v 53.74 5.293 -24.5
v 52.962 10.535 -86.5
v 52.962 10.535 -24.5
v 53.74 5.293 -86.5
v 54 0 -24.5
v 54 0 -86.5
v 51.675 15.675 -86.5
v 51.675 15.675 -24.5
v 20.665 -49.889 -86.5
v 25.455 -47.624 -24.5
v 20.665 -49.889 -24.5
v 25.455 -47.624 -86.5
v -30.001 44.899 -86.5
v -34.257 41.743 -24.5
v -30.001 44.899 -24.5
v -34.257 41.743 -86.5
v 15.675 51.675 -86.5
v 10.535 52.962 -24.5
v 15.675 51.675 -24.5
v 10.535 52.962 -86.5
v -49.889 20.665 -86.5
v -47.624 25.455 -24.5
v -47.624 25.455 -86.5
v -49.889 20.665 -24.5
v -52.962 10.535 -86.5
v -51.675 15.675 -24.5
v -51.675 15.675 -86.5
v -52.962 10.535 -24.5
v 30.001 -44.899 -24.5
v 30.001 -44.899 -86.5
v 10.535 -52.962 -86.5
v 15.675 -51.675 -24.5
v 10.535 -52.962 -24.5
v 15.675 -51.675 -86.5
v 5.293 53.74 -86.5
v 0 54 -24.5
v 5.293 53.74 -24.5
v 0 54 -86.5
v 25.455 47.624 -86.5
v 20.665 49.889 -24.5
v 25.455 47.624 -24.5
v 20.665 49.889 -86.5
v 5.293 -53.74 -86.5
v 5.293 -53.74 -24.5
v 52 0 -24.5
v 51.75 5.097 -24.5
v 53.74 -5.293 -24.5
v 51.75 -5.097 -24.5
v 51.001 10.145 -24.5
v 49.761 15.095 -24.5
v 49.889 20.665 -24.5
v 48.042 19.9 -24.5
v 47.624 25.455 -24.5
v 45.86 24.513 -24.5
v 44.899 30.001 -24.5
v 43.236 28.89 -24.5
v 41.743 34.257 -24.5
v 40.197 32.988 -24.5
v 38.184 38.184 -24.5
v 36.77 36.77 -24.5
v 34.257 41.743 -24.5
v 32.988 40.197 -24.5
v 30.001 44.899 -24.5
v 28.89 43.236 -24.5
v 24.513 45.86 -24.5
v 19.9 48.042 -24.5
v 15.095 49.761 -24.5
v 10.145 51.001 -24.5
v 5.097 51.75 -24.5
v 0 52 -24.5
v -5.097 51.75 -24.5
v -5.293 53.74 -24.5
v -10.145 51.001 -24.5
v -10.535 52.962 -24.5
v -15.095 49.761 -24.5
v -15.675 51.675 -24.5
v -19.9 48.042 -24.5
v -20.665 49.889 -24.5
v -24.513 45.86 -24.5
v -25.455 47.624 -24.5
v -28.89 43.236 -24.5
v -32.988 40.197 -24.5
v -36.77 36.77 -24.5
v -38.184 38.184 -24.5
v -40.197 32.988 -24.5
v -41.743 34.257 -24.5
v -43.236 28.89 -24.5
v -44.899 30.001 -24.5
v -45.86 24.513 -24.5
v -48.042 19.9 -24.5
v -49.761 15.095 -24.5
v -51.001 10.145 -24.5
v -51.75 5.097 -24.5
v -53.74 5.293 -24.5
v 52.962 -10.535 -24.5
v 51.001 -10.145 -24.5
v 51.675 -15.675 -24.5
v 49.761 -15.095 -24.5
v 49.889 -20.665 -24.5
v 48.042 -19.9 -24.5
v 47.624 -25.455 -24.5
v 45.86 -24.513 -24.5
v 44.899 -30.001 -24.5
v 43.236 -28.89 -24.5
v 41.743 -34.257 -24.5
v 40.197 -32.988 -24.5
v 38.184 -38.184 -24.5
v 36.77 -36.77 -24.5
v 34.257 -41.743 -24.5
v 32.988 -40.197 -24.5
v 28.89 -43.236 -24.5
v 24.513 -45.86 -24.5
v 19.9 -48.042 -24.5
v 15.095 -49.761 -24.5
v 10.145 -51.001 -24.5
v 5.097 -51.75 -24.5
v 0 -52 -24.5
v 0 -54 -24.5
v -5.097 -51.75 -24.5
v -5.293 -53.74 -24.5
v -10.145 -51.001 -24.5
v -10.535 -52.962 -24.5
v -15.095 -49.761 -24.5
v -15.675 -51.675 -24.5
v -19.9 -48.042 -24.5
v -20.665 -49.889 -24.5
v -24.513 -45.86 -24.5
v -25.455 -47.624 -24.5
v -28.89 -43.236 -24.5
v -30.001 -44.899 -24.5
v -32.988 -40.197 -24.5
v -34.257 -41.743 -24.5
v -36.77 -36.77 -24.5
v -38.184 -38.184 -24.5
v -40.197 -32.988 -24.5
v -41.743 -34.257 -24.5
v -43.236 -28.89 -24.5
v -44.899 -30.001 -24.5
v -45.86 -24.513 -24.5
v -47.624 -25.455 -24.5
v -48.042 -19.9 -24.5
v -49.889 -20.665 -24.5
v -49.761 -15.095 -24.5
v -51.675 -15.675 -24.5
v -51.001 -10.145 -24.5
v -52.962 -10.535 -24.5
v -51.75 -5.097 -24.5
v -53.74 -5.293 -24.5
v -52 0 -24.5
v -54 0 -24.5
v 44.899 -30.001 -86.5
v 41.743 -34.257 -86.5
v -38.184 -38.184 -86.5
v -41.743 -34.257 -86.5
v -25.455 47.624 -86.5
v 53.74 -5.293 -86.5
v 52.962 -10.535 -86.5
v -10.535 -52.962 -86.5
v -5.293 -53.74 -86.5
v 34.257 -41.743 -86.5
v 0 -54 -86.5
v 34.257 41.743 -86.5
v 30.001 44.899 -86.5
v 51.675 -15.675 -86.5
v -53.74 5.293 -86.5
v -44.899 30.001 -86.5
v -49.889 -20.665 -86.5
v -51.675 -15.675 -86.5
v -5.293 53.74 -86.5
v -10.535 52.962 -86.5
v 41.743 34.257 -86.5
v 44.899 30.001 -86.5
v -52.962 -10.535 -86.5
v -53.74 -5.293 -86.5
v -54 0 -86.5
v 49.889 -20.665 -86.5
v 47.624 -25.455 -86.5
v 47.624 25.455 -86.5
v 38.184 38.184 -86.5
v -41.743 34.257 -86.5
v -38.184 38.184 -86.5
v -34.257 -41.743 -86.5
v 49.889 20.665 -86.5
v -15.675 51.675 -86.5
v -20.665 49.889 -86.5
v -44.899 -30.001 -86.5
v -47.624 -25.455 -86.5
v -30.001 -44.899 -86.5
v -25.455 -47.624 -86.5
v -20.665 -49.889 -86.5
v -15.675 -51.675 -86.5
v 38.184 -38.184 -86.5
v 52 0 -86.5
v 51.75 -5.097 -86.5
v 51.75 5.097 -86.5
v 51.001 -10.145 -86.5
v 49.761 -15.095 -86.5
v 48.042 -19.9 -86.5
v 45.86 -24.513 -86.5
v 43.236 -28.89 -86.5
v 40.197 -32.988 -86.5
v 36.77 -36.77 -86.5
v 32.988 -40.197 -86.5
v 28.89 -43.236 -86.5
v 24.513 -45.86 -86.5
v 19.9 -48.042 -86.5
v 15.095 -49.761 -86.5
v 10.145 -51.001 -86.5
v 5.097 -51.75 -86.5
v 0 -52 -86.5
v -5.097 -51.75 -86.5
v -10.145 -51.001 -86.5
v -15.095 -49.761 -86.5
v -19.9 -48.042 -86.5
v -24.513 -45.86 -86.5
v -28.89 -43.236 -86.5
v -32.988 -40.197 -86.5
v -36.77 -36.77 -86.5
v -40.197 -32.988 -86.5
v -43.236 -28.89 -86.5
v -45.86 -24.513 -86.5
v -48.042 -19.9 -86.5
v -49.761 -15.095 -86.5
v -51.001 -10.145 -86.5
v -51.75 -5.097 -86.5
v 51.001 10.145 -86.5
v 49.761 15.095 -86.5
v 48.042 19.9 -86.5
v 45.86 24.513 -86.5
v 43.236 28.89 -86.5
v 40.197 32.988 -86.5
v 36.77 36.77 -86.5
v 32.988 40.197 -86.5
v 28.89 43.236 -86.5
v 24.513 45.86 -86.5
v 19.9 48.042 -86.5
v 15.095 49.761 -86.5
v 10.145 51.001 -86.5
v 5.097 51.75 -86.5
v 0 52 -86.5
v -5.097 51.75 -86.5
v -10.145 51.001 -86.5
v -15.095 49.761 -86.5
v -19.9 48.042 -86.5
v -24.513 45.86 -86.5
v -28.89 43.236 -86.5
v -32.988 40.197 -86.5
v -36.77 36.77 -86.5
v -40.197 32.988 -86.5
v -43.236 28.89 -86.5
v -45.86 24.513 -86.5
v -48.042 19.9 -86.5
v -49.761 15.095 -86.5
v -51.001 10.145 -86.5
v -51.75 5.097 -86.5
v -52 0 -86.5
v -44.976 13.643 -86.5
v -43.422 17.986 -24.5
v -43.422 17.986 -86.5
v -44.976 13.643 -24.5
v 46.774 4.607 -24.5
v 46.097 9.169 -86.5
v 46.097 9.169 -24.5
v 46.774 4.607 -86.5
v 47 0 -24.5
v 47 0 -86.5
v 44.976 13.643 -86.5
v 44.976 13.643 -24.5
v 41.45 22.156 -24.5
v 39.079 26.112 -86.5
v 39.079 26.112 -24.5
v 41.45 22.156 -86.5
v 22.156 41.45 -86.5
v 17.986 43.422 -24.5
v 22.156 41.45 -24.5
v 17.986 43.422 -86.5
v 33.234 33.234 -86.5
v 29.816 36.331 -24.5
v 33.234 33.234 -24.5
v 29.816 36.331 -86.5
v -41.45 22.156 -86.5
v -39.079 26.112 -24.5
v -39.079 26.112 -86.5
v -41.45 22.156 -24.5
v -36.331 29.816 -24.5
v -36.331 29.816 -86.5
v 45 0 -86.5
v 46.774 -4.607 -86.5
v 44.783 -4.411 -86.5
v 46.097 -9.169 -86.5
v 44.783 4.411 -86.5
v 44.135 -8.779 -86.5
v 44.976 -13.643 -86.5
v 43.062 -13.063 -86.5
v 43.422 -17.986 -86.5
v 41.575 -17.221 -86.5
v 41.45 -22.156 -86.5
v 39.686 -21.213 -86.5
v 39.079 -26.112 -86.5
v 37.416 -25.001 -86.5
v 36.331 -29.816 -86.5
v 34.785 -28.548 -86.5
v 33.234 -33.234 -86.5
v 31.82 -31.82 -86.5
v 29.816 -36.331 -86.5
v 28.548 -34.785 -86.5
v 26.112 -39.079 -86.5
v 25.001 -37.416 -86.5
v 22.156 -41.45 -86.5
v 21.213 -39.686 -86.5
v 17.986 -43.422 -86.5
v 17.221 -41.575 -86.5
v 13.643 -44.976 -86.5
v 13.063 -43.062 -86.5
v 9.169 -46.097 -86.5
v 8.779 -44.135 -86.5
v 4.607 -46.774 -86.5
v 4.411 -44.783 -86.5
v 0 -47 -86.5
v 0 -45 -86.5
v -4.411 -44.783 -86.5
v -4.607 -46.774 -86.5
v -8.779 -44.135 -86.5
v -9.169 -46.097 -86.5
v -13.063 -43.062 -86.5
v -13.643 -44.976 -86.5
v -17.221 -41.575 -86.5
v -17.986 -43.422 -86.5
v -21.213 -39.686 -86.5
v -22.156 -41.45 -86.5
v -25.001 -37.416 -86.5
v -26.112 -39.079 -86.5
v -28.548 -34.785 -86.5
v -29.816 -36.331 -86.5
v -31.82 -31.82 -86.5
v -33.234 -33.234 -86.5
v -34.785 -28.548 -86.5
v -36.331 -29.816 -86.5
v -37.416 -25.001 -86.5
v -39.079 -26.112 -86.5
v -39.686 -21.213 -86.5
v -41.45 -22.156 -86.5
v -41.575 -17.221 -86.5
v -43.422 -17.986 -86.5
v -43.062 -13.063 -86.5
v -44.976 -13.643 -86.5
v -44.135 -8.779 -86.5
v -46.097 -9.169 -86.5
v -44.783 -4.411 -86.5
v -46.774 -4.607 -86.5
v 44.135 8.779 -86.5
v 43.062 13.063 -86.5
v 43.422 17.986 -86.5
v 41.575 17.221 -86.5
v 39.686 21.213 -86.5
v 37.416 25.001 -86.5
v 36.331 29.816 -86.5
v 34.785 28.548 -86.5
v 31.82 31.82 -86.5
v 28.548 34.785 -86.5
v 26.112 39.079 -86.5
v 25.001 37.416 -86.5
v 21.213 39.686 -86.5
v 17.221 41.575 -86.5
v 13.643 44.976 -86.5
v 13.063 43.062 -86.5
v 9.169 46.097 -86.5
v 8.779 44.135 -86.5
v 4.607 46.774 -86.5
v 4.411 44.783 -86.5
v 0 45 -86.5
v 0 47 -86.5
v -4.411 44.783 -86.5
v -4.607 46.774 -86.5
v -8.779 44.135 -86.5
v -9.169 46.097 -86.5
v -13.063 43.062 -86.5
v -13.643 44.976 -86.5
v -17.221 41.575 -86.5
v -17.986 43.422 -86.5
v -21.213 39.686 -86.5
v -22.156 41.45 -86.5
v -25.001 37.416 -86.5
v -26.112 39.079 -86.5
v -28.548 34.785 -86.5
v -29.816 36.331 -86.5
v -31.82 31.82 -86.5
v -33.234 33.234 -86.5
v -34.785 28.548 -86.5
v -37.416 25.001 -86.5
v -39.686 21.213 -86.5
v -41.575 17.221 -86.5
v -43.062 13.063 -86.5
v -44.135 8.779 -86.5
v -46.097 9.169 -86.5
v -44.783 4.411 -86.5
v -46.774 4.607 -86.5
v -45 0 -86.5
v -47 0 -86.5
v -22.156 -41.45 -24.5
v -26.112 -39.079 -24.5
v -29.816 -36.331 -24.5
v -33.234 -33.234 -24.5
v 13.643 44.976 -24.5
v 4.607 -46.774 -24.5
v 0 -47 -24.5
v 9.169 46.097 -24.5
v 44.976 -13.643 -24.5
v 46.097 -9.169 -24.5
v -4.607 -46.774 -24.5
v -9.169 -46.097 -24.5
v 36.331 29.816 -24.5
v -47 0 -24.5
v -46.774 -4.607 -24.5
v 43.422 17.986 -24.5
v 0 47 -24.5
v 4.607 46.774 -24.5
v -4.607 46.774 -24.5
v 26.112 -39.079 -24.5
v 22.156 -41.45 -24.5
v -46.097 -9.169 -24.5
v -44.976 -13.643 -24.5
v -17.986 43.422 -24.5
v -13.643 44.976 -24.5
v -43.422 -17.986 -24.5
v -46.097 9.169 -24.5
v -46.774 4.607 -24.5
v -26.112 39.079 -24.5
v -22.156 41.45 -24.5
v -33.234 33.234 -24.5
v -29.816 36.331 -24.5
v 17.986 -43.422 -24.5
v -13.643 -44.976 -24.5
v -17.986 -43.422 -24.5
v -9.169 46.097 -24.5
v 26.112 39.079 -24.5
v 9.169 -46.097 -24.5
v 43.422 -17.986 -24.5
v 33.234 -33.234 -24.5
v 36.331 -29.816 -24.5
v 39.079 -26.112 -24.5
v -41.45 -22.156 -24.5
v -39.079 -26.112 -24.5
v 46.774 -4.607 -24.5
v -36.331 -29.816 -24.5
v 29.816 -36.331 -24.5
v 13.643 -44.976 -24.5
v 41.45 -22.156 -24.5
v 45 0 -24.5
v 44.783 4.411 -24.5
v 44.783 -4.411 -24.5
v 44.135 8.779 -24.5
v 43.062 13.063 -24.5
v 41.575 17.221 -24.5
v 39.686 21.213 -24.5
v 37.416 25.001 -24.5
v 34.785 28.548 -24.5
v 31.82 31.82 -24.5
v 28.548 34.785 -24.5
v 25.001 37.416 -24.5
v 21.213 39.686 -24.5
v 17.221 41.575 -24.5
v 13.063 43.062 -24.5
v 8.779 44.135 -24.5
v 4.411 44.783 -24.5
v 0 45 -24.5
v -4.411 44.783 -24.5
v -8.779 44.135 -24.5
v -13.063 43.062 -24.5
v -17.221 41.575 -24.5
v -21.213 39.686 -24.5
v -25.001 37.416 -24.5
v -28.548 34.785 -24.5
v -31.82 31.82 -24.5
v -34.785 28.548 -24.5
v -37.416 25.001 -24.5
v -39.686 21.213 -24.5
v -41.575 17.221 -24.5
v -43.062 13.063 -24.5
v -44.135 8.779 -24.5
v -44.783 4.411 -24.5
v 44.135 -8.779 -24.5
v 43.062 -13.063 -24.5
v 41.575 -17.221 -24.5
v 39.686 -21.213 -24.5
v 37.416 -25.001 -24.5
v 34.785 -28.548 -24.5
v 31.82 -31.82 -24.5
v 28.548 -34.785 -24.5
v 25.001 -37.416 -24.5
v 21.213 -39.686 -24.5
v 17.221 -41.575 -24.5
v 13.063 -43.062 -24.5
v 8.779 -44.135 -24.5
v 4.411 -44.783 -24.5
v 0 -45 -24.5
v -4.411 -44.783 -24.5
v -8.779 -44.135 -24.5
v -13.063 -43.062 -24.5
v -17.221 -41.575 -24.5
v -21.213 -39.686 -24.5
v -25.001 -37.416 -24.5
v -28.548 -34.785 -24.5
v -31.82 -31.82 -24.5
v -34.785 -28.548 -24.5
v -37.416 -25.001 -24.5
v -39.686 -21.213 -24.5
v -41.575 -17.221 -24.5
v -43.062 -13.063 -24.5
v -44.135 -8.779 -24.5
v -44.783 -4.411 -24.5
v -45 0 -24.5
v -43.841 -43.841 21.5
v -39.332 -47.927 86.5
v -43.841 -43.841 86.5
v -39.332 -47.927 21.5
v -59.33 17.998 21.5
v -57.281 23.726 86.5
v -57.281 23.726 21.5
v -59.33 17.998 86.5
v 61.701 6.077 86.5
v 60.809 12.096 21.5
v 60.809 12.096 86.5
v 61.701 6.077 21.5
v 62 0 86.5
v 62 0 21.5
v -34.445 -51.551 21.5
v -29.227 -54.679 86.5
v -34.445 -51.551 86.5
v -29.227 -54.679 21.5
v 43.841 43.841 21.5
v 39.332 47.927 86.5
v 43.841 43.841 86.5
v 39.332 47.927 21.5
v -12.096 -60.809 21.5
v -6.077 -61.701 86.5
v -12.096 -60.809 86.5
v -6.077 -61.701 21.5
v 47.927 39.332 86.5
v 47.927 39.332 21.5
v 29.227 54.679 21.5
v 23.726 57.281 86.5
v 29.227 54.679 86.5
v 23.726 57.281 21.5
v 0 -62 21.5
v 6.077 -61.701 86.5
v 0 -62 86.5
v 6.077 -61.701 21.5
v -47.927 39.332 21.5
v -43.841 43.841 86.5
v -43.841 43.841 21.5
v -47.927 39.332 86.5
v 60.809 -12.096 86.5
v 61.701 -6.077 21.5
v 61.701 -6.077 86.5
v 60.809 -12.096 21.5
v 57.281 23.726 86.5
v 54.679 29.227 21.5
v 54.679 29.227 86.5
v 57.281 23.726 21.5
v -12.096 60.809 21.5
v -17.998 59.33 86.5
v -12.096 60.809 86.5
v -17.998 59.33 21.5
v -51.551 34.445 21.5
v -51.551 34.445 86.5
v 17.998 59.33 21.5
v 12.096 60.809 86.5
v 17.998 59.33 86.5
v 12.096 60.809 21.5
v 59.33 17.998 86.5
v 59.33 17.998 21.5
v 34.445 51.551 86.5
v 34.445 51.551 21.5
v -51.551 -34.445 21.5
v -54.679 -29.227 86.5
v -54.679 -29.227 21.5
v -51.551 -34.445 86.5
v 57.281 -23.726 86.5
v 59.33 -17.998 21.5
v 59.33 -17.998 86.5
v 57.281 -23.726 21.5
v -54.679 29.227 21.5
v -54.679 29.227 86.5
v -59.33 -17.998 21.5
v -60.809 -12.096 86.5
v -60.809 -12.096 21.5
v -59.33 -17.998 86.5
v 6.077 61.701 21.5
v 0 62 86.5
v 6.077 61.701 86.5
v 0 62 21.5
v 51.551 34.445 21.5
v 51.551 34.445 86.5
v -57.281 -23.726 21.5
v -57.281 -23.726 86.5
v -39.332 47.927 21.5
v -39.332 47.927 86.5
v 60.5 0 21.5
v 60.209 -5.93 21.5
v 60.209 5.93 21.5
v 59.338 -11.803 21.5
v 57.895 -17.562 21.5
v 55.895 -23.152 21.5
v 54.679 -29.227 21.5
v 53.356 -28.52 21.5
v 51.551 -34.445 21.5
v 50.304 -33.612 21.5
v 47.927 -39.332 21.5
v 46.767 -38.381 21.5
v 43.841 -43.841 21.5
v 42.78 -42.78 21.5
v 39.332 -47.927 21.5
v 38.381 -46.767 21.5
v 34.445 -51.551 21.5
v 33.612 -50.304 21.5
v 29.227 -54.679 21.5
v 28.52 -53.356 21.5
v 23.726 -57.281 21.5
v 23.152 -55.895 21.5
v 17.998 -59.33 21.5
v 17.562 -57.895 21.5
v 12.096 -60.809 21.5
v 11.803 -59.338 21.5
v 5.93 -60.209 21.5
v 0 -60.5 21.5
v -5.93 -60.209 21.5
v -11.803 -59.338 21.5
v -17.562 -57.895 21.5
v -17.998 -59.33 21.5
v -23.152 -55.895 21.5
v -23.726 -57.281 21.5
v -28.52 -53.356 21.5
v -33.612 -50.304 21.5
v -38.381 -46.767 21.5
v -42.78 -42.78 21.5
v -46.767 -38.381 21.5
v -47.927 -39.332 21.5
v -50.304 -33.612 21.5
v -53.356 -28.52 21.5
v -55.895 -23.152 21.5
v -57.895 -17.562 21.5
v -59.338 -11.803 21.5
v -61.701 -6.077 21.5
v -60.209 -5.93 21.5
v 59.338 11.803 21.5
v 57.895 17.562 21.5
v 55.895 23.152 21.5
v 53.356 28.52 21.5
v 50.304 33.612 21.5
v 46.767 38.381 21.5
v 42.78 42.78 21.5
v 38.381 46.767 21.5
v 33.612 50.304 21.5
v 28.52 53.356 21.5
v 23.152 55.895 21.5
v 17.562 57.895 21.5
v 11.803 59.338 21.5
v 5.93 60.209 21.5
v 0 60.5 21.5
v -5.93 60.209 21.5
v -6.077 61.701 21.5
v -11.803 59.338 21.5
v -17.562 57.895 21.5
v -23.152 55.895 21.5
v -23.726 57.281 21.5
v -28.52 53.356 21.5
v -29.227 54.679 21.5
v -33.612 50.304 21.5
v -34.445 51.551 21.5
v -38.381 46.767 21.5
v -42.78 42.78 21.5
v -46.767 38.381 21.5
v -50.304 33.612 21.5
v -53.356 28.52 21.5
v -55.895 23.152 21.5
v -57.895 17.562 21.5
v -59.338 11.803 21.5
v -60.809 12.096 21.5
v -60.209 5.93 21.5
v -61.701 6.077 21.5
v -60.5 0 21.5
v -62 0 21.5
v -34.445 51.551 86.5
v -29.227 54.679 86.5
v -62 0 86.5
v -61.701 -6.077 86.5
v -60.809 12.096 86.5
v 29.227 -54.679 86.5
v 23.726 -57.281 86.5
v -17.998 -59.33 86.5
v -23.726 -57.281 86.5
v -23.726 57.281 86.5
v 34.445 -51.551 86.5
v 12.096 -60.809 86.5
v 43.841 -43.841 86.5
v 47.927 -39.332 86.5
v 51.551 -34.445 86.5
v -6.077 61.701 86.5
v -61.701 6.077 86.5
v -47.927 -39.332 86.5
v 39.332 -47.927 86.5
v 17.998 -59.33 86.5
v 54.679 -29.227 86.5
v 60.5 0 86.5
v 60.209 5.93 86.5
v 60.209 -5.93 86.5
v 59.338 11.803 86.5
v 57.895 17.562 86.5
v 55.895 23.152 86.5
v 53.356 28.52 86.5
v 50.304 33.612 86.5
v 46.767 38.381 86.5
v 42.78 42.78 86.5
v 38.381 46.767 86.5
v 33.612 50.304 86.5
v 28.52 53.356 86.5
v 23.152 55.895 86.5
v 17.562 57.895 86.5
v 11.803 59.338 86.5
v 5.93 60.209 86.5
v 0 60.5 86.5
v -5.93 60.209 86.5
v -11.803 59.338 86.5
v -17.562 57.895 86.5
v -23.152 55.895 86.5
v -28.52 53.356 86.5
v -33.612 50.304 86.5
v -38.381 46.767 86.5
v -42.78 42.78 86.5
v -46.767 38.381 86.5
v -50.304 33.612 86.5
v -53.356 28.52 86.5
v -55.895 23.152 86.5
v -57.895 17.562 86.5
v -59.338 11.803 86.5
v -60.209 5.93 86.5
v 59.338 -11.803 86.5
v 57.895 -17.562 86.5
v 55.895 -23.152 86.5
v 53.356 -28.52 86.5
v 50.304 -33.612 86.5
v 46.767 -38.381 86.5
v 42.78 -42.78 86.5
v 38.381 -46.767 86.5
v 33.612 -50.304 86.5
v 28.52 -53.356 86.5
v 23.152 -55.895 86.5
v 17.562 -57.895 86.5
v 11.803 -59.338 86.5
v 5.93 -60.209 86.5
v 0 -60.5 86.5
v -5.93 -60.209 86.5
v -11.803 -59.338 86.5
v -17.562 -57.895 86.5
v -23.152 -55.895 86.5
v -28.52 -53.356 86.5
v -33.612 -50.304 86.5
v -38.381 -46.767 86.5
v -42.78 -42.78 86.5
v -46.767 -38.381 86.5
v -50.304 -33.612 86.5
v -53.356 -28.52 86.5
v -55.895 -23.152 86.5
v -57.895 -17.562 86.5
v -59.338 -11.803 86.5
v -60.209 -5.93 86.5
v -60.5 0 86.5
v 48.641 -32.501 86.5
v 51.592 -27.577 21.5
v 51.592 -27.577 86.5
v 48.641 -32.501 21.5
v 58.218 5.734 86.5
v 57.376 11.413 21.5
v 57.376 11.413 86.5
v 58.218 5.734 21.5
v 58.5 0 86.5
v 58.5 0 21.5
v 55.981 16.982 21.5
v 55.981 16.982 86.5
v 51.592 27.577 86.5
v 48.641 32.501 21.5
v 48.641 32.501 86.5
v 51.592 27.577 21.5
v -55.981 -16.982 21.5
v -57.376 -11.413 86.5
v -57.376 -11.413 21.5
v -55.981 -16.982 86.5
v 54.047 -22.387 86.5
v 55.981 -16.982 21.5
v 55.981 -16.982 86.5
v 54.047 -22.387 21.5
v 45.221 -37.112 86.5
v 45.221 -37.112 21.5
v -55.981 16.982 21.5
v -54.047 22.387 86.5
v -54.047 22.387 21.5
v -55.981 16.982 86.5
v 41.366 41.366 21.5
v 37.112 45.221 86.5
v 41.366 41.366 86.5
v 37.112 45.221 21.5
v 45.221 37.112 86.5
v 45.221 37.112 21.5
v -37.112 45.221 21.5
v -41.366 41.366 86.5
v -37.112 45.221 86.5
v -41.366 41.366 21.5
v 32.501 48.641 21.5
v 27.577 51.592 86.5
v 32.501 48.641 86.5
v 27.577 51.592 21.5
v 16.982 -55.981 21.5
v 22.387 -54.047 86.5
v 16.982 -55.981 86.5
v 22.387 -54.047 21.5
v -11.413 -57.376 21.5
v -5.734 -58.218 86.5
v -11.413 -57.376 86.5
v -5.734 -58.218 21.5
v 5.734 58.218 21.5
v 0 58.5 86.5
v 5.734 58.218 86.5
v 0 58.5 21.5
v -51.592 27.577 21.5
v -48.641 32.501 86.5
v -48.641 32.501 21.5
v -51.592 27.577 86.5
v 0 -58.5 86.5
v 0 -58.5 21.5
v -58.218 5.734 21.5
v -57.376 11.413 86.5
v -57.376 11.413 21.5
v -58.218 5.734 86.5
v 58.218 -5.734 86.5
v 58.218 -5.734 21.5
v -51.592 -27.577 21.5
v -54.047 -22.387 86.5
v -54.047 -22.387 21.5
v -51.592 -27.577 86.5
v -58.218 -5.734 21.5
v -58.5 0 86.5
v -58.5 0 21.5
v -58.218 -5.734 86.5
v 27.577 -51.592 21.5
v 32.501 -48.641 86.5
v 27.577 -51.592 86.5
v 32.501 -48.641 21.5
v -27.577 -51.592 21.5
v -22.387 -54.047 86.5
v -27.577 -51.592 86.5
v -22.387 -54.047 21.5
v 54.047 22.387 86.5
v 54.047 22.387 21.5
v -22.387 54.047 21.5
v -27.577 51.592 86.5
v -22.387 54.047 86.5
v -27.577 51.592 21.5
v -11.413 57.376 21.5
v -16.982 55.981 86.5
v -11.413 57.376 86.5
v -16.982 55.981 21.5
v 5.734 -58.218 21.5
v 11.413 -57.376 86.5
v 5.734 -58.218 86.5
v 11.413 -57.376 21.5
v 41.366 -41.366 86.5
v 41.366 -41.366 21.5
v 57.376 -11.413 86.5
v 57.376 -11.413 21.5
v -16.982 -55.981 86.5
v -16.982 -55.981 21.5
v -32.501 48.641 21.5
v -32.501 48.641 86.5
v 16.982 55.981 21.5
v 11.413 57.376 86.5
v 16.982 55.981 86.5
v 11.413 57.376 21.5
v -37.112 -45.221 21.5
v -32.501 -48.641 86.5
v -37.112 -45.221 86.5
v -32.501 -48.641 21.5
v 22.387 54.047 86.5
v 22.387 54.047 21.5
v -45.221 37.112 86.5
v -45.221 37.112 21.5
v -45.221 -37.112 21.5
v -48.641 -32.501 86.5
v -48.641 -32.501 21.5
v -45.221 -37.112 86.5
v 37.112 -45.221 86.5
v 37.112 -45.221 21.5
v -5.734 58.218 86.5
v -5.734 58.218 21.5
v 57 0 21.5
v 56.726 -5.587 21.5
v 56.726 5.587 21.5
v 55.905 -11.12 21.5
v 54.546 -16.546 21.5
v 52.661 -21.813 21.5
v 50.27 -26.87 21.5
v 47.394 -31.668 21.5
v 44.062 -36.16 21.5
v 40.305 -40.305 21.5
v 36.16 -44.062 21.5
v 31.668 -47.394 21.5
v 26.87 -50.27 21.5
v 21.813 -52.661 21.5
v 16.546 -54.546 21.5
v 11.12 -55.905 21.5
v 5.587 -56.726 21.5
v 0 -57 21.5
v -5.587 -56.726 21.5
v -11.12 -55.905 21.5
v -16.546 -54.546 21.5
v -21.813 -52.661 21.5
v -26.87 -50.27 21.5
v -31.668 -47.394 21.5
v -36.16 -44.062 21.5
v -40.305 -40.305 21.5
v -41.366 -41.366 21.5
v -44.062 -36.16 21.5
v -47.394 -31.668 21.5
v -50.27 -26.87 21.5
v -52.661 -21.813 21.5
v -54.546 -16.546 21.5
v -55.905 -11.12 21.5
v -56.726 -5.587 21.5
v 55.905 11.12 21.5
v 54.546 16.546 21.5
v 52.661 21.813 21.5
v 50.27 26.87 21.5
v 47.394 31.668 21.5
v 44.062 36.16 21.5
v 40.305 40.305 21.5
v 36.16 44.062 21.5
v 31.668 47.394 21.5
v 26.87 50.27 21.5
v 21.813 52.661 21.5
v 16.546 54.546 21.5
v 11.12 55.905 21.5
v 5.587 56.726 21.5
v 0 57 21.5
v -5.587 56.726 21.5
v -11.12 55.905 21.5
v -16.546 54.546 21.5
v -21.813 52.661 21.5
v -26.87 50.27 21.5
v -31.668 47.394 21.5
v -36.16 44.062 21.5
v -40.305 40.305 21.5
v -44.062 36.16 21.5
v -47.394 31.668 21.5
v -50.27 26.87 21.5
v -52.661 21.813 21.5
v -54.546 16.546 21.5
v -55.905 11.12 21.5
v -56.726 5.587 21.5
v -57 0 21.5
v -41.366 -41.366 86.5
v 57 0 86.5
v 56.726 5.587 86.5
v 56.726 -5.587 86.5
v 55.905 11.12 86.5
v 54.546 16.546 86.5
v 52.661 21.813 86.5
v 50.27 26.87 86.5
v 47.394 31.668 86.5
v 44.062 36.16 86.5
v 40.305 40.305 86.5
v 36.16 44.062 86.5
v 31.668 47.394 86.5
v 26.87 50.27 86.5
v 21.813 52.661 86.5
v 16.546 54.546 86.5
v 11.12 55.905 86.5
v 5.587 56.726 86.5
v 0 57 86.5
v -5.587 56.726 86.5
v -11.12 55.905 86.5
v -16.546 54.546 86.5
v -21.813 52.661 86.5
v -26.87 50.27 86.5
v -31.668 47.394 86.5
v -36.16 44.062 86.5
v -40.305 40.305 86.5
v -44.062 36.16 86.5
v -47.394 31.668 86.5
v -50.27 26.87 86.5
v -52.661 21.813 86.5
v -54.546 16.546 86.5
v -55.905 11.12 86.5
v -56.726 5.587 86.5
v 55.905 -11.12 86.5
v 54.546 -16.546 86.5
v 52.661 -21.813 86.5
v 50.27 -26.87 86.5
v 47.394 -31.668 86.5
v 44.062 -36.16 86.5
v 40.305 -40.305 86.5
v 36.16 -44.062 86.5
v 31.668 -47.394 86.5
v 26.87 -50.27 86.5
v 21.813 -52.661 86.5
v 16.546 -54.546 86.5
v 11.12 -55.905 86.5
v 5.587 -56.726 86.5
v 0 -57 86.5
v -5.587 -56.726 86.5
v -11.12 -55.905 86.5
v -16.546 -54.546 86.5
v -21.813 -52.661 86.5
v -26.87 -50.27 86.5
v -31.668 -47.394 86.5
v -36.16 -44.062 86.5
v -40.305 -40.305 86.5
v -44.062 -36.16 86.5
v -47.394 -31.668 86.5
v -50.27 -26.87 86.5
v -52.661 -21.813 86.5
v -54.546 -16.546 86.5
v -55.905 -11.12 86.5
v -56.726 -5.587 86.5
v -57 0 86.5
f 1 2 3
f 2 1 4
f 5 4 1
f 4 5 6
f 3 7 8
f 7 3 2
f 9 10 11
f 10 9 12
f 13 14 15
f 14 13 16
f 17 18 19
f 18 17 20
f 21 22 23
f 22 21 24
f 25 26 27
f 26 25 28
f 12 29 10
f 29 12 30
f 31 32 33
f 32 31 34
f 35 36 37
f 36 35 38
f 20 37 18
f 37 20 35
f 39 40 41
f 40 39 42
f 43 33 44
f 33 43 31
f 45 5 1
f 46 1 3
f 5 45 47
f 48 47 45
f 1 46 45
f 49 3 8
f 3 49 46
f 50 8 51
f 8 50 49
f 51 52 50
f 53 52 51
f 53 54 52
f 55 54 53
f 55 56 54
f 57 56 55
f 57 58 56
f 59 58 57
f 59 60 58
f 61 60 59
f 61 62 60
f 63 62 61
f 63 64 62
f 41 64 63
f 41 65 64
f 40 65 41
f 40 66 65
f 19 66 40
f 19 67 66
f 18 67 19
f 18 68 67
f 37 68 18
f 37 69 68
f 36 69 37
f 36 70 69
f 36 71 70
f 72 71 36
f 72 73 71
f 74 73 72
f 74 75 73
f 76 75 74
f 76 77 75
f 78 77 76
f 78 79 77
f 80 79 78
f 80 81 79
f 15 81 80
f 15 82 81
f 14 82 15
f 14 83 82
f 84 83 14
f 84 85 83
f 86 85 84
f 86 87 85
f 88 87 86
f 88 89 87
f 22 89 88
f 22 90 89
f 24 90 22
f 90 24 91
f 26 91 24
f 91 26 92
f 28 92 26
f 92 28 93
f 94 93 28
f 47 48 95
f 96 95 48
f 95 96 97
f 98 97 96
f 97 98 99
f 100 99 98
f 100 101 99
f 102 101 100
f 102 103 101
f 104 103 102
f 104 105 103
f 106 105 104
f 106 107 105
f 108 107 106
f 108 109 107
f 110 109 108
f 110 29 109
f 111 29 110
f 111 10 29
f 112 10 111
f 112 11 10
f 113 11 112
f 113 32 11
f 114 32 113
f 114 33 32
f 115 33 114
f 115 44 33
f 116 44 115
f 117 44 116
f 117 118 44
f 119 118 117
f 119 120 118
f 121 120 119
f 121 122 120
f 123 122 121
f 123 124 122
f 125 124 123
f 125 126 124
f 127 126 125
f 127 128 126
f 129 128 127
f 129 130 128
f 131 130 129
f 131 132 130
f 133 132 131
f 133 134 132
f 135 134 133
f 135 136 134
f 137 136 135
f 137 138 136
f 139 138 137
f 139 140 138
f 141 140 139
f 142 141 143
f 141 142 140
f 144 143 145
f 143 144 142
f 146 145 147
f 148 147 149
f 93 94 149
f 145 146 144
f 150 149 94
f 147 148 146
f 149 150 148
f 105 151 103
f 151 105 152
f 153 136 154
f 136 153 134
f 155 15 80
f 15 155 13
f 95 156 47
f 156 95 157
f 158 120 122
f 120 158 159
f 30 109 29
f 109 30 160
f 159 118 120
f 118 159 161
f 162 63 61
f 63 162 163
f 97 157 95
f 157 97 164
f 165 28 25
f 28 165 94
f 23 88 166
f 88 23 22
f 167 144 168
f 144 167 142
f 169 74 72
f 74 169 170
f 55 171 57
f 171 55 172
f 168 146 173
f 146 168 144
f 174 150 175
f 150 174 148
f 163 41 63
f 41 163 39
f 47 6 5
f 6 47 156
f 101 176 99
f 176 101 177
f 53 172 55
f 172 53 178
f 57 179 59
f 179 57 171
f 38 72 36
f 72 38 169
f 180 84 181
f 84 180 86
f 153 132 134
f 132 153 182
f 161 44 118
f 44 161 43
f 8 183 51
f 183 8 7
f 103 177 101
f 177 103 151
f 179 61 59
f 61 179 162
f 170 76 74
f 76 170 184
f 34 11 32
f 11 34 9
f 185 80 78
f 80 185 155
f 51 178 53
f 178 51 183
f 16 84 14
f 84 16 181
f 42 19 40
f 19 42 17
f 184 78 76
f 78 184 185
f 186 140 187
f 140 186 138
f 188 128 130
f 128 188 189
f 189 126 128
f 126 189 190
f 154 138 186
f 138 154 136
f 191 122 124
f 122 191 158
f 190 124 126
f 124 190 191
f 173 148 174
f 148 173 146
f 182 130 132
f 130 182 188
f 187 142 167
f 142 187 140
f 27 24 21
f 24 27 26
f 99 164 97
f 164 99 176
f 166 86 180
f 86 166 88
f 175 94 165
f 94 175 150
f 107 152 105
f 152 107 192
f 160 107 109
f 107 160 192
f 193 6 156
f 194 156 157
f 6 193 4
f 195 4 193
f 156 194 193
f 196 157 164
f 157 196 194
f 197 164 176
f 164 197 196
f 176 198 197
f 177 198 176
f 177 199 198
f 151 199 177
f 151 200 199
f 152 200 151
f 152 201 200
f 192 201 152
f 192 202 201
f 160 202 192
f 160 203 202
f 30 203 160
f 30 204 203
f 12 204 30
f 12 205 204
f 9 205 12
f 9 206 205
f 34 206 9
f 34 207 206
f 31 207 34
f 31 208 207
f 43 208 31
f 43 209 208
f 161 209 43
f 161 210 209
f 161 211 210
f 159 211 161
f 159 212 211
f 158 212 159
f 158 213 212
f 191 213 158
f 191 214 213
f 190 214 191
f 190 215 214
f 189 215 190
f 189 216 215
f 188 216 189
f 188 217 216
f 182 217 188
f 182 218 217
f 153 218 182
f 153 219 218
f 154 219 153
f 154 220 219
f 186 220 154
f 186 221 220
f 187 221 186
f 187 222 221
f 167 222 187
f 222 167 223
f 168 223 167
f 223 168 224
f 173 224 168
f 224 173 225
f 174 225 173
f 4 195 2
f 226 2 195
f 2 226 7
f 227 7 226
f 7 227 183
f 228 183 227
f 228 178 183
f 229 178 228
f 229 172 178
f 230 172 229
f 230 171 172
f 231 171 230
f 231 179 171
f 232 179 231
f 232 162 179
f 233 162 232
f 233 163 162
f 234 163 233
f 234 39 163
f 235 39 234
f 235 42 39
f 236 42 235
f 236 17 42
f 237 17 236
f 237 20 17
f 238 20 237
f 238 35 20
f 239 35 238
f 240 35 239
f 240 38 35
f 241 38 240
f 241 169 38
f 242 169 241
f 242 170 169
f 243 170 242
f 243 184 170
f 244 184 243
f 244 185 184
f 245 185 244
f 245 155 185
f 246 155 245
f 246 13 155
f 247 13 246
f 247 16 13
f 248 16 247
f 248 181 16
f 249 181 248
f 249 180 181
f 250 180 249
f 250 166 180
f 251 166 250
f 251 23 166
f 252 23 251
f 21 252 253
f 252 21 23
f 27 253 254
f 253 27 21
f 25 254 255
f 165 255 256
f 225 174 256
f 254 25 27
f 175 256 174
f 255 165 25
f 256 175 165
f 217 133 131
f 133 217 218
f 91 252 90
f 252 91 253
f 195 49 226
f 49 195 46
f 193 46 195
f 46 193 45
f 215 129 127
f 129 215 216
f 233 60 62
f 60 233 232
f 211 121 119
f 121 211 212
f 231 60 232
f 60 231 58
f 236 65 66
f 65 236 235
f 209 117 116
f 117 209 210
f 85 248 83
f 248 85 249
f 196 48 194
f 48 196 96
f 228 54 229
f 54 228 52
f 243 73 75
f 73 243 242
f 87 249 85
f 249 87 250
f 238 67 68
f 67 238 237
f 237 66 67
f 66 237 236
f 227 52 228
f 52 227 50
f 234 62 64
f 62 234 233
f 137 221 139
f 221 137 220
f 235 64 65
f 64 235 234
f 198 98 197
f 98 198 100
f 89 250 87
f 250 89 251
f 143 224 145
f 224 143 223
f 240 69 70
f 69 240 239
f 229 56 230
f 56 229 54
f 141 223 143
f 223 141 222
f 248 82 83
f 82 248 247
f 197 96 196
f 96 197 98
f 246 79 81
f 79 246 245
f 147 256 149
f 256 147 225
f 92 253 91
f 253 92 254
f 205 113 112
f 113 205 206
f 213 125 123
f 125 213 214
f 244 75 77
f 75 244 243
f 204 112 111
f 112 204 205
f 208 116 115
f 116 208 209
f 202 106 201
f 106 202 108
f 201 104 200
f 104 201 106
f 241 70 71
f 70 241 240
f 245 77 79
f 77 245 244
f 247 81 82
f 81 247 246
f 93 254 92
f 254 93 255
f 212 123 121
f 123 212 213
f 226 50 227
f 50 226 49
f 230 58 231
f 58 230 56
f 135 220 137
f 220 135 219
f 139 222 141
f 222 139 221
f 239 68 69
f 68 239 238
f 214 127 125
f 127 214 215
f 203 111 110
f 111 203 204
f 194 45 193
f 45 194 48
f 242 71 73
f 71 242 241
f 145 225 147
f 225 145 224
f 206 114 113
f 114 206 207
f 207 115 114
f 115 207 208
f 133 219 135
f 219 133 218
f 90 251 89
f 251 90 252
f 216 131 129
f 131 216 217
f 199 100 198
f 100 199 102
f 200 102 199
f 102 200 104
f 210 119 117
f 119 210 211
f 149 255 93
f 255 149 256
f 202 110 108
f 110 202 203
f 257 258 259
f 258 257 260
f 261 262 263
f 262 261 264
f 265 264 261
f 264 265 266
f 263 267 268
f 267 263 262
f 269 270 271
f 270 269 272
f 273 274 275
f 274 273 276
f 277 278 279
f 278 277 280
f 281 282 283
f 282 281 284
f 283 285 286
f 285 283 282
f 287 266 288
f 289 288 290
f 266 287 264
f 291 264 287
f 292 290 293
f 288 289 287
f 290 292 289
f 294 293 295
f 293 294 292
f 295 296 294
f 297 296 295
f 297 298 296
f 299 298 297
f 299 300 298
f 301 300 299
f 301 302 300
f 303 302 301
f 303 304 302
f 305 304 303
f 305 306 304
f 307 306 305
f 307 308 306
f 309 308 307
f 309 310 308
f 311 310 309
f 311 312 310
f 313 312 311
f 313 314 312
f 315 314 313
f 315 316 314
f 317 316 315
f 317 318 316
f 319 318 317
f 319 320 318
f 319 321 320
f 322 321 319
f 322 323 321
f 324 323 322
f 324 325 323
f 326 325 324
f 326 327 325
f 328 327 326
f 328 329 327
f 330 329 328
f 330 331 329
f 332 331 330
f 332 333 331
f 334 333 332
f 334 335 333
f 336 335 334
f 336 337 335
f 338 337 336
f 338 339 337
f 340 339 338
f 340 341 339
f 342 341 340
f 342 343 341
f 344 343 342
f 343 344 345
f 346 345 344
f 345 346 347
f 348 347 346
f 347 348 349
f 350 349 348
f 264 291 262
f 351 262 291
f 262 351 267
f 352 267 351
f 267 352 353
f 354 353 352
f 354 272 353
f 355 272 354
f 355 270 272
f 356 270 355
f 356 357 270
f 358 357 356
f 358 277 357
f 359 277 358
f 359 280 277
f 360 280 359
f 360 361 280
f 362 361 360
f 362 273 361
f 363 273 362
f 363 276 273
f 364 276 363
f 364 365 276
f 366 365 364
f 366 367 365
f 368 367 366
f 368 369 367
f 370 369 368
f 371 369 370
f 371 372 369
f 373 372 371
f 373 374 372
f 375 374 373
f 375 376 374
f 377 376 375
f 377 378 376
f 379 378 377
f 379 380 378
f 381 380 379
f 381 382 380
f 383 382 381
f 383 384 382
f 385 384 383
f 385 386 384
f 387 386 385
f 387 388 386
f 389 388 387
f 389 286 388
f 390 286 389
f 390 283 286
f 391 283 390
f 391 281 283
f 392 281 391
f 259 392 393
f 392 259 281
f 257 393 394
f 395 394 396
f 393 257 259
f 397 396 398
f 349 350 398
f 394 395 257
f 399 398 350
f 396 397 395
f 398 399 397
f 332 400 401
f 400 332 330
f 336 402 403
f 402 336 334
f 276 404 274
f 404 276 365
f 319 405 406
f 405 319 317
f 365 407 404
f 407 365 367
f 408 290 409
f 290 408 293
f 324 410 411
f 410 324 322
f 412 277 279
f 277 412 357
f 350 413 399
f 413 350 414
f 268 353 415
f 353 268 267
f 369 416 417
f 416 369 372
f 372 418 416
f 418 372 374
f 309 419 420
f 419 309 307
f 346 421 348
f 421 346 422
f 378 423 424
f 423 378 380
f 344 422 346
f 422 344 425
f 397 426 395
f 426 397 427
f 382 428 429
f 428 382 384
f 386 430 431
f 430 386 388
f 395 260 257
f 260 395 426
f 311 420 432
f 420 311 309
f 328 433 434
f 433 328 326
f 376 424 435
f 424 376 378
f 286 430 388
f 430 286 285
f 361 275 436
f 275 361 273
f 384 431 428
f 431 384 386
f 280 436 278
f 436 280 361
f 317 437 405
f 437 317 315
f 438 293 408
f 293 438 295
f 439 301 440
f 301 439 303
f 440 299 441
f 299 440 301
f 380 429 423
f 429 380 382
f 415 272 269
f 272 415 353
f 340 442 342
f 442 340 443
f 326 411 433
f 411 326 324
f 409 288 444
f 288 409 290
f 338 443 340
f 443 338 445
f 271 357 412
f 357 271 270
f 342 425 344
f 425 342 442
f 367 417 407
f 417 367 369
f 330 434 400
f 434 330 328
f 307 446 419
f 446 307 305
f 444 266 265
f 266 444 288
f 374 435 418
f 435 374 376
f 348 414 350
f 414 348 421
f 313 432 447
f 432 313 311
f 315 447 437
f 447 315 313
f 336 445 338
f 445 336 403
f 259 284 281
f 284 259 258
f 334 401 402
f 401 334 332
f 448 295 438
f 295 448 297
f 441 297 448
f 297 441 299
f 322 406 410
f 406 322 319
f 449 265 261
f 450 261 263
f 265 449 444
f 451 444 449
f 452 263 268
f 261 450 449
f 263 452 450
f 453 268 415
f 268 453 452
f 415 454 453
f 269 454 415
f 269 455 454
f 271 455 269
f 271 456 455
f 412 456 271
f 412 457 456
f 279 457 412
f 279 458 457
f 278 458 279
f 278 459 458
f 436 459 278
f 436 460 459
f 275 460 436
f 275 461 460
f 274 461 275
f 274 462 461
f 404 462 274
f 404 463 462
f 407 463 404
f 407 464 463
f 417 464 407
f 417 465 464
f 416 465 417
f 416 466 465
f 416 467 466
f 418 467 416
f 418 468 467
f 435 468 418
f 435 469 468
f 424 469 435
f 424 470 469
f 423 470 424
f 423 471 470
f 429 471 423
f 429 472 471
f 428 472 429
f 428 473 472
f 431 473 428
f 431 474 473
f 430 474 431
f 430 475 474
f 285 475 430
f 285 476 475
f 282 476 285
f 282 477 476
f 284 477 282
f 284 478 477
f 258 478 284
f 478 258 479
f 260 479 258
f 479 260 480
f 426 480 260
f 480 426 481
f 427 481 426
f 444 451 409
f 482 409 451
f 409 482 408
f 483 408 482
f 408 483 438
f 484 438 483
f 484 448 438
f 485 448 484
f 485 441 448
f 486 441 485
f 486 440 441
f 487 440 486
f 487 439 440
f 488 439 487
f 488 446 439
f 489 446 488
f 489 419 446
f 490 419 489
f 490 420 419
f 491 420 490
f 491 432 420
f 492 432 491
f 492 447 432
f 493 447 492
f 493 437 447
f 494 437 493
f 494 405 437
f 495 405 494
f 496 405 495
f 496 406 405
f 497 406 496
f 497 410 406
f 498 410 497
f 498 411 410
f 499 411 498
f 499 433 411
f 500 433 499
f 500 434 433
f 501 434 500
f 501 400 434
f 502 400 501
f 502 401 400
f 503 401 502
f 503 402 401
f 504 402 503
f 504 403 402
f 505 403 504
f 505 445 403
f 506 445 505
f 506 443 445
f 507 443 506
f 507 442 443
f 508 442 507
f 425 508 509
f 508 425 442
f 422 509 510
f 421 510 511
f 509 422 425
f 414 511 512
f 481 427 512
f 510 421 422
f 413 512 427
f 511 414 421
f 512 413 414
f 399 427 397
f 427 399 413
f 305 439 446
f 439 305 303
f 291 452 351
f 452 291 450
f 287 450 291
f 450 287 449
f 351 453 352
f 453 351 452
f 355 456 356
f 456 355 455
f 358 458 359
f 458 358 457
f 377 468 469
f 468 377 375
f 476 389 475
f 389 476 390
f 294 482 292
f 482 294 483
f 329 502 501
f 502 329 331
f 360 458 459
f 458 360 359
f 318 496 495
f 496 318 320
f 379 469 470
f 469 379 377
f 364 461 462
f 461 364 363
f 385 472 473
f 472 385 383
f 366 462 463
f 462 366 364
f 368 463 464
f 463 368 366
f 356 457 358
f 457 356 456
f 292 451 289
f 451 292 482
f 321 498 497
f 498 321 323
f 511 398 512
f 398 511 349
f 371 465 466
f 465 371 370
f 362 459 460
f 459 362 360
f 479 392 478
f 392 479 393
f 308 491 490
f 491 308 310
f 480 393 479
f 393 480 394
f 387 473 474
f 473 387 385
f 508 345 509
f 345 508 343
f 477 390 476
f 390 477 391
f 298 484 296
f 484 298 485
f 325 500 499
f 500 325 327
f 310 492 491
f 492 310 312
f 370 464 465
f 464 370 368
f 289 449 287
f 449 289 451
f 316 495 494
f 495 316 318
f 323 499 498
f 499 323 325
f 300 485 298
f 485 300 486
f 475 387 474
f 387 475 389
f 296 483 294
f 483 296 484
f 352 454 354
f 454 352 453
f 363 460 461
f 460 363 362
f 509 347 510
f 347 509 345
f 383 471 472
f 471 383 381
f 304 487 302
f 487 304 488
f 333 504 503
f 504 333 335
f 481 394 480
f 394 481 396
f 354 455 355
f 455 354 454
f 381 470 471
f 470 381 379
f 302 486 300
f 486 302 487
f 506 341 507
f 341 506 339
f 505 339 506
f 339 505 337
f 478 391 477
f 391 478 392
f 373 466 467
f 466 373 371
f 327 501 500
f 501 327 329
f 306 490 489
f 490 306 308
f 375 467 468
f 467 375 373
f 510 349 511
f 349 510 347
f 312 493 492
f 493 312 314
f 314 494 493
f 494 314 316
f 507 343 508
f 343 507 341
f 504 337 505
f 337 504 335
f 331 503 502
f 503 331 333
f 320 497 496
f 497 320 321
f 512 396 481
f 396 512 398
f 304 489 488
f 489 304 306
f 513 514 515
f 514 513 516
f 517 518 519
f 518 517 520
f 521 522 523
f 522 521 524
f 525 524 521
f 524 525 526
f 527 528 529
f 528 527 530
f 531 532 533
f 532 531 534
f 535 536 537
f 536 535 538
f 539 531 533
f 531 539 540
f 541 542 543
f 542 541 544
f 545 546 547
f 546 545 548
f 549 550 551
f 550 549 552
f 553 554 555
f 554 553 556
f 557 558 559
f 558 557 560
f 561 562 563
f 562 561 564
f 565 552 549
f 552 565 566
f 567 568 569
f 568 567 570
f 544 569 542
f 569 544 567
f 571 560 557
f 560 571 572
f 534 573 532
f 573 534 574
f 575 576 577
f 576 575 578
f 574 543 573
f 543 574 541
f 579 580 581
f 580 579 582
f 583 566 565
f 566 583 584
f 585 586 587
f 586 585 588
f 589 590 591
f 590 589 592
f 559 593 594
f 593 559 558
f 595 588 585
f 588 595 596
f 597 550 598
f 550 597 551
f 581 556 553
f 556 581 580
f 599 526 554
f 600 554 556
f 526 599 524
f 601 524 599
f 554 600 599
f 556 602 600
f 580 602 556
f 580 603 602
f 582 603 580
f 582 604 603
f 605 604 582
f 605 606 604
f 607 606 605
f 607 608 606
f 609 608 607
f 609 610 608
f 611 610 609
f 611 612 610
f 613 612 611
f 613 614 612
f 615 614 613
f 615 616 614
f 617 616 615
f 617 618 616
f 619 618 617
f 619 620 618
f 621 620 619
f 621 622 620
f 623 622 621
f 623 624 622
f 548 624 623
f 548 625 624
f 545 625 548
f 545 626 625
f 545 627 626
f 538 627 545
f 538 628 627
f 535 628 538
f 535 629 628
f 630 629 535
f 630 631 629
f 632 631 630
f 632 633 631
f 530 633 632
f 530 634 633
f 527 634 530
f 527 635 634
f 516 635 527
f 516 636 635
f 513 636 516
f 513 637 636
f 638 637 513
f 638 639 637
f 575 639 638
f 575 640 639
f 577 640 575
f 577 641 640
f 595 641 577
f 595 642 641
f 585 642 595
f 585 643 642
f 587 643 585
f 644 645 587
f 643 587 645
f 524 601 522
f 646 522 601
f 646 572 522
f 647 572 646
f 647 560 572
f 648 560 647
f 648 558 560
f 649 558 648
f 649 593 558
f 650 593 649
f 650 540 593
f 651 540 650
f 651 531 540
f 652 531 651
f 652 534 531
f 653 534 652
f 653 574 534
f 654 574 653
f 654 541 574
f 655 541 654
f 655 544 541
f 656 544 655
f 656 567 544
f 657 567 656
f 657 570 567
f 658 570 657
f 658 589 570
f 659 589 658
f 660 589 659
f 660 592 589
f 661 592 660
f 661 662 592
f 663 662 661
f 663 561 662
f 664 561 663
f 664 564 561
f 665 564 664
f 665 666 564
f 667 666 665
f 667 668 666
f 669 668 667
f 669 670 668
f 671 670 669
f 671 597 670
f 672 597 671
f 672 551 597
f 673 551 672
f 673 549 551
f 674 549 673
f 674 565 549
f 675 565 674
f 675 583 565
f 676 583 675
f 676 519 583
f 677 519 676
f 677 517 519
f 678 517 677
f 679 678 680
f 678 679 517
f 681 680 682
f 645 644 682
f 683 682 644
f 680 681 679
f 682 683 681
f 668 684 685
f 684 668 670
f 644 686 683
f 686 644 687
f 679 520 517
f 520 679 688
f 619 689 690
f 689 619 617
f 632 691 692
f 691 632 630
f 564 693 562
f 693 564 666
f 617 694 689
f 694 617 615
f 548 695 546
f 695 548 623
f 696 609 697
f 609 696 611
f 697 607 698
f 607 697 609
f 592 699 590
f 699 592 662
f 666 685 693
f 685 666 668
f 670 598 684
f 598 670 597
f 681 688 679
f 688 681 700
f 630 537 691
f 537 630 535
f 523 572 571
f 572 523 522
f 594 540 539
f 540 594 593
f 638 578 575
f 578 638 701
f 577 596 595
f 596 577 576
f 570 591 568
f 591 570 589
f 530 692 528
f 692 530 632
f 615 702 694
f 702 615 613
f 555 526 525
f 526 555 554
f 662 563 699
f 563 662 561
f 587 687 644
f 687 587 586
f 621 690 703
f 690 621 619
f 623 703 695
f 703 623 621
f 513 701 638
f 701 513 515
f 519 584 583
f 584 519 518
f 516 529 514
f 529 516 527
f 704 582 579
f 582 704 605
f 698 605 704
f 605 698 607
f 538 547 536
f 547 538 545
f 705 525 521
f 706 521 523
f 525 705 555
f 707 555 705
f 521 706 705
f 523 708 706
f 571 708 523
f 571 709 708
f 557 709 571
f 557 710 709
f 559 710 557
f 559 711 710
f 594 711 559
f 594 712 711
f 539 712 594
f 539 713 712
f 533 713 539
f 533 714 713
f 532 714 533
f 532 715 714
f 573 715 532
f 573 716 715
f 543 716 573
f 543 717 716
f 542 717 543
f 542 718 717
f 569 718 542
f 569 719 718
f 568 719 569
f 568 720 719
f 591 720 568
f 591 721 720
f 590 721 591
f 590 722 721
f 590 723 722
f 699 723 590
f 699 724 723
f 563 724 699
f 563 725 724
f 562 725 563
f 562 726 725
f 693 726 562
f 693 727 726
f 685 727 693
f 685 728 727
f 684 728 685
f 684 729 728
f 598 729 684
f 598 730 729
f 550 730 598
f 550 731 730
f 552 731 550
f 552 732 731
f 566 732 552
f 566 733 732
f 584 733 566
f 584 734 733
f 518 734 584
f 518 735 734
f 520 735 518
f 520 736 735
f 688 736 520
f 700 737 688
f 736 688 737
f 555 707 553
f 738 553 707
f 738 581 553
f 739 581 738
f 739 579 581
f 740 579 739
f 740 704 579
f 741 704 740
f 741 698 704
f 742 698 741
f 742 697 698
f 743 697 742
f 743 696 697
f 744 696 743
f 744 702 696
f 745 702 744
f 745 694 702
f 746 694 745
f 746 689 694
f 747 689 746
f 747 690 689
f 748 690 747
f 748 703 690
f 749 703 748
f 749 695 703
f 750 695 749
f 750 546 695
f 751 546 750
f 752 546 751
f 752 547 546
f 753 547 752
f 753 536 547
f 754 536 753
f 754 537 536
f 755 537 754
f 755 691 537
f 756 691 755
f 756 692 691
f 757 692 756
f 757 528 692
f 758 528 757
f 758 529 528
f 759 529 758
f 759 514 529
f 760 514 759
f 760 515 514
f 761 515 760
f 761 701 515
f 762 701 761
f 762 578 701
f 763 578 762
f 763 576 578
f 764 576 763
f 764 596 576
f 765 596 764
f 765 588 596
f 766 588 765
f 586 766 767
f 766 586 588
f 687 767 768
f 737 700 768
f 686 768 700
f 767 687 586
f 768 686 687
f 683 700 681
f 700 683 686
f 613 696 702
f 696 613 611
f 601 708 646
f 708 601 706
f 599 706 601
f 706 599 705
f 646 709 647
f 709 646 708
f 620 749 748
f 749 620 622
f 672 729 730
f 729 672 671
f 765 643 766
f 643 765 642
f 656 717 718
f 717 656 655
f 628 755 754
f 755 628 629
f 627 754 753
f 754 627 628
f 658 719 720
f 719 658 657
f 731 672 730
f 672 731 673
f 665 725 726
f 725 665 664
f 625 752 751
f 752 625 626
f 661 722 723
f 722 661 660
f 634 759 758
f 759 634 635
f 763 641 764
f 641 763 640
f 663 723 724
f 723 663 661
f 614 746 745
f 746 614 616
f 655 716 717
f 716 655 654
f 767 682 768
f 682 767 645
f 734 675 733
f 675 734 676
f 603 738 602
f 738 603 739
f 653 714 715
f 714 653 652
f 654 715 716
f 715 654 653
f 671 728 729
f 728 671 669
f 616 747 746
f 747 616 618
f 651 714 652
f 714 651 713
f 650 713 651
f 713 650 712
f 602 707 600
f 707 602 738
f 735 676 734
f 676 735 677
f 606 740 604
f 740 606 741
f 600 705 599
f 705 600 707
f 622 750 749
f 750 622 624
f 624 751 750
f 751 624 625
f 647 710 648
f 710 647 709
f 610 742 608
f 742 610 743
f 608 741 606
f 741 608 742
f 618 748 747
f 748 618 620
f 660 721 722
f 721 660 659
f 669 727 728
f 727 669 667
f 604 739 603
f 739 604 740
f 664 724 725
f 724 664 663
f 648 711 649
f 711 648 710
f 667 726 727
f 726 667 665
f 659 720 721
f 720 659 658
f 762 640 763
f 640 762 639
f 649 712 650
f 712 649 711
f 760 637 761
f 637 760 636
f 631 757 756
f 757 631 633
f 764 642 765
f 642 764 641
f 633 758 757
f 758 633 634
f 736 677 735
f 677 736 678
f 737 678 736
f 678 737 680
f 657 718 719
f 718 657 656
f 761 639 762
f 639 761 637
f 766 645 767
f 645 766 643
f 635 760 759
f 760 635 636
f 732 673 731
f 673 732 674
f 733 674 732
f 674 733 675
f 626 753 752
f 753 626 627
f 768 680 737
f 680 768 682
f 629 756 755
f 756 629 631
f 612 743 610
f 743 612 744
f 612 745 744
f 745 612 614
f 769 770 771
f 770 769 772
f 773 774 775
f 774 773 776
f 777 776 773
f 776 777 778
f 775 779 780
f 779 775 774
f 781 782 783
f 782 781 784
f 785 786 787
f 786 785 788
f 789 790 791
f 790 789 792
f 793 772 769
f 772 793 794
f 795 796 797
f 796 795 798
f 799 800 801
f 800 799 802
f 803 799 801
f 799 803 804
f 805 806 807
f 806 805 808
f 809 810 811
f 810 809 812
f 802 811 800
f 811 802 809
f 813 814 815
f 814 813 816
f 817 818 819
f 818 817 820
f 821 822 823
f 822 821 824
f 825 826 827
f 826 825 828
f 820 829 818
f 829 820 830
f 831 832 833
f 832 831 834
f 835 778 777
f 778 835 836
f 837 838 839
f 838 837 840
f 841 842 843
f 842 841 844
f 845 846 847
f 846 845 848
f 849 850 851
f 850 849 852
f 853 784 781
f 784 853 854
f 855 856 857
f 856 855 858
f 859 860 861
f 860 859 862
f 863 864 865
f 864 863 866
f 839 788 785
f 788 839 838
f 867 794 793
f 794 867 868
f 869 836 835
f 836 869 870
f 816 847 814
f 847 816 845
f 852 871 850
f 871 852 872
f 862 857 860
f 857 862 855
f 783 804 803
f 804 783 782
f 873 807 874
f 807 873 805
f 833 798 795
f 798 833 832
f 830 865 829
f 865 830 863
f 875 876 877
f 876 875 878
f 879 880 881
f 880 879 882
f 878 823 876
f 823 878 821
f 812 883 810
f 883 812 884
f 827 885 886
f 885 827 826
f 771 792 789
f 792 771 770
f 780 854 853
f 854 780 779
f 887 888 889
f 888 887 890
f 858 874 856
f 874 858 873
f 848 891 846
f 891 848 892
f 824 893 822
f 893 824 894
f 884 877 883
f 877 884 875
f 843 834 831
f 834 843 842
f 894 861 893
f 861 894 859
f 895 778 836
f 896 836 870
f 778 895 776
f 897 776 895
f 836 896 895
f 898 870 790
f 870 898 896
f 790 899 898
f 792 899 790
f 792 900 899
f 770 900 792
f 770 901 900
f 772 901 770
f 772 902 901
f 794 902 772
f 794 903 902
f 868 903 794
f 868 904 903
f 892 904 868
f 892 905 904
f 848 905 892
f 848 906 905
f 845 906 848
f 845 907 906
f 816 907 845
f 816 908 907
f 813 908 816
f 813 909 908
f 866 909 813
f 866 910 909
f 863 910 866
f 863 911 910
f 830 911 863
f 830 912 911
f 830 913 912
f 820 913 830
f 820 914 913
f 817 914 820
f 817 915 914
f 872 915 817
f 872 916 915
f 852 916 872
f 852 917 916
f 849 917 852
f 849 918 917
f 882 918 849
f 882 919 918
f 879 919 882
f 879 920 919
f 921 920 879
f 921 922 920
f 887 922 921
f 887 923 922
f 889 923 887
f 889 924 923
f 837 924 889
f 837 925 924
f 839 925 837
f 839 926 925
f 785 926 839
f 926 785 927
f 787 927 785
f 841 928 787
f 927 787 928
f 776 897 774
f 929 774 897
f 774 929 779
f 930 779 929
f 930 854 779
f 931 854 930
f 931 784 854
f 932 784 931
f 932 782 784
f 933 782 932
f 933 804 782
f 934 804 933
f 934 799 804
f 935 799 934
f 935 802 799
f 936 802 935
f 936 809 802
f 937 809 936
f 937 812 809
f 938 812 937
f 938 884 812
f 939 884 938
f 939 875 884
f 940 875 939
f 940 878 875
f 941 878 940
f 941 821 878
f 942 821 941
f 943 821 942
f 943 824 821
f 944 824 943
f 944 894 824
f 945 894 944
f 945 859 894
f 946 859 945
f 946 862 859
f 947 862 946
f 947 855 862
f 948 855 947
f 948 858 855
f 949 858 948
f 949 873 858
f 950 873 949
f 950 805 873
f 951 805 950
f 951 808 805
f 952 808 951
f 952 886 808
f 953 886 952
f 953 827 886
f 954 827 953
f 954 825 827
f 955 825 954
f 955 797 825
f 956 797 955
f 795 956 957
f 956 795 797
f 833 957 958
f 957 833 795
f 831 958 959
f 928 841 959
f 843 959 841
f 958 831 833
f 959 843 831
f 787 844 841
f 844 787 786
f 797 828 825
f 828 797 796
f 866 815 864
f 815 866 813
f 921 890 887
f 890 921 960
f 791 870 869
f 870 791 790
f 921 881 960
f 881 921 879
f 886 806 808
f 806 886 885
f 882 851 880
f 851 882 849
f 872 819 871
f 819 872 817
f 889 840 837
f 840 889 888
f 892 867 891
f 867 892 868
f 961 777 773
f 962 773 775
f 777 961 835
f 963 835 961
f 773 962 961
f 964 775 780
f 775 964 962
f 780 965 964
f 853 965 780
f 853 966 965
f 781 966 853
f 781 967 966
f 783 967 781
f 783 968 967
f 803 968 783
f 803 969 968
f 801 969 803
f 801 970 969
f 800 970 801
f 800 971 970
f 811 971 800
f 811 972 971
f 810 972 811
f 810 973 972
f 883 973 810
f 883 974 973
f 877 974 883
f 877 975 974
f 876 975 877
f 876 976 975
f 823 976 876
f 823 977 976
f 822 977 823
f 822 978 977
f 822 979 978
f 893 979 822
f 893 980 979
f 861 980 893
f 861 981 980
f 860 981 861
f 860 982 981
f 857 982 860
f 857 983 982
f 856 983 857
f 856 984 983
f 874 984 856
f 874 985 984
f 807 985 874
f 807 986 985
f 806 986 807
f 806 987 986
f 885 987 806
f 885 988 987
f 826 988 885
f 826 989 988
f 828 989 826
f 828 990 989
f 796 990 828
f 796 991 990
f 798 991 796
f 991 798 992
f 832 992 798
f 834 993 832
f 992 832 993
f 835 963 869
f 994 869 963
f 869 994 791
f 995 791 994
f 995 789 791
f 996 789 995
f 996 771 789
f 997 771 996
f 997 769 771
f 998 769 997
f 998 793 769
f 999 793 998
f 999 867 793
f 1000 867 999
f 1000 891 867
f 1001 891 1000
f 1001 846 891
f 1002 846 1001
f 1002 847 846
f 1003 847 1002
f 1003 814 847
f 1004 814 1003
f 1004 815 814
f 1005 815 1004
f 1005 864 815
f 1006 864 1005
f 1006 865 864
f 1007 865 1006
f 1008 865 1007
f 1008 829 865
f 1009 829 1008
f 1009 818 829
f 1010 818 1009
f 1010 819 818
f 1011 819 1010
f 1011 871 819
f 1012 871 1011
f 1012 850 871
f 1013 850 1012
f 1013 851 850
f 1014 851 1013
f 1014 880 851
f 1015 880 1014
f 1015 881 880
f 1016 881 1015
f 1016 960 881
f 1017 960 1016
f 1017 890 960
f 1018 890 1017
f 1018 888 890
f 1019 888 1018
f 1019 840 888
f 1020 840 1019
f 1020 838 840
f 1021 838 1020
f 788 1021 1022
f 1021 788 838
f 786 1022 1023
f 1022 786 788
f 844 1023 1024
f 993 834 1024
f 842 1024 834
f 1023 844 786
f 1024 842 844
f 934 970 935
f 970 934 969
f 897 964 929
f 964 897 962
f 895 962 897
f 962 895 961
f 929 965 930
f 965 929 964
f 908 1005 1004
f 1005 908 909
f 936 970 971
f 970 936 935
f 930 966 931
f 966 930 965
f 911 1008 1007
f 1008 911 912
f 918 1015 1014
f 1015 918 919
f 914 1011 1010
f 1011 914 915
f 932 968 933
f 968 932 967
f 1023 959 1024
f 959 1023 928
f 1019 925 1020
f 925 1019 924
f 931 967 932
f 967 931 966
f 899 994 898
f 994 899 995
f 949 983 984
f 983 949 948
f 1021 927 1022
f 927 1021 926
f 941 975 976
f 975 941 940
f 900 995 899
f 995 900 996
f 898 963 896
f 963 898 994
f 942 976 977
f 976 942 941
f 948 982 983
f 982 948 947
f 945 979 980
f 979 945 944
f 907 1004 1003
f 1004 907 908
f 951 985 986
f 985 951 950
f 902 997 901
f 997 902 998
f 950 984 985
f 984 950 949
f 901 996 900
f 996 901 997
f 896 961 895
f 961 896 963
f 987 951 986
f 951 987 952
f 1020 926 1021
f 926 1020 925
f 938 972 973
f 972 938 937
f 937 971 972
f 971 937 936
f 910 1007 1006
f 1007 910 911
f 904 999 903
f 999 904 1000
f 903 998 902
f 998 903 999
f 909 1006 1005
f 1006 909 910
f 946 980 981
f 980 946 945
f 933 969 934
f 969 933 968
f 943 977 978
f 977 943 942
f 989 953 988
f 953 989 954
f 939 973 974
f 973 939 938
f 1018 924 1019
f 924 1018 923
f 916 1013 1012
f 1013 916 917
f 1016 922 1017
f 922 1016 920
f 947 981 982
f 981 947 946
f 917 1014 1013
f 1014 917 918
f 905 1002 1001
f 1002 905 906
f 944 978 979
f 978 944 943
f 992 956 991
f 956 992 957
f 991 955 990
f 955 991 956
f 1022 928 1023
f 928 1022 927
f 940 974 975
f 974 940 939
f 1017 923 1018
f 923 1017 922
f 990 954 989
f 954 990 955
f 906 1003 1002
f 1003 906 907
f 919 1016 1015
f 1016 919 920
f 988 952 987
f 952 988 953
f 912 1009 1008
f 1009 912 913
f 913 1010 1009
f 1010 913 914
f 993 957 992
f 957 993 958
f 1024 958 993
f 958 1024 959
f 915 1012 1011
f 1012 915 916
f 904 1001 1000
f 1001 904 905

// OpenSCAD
// ============================================================================
// Atom Lithography Machine — Parametric OpenSCAD Module (S1.3-04)
// ============================================================================
// part_id           : S1.3-04
// parent_bom_id     : S1.3
// subsystem         : S1
// part_name         : Kolon ici cift katmanli mu-metal manyetik kalkan kilifi
// material          : Mu-metal
// temp_stage        : 300 K
// vacuum_grade      : UHV / Dis kilif
// tolerance         : ±0.2 mm cap
// computed_mass_kg  : 1.30722
// envelope_mm       : 124.000 x 124.000 x 173.000
// design_maturity   : M0_M1_DETAILED_CAD_DESIGN_ONLY
// no_lab_measurement: true
// iec61508_certified: false
// semi_s2_certified : false
// Units: millimeters (mm)
// ============================================================================

$fn = 64;

// Nominal bounding envelope parameters (mm)
bbox_x = 124.0000;
bbox_y = 124.0000;
bbox_z = 173.0000;

// Part-specific parametric dimensions
hi_od = 124.0;
hi_id = 114.0;
lo_od = 108.0;
lo_id = 90.0;
attenuation_dB = 40.0;

// Interface / port parameters (mm)
port_lower_shield_bore_od = 108.000;
port_lower_shield_bore_bore = 90.000;
port_upper_shield_bore_od = 124.000;
port_upper_shield_bore_bore = 114.000;

module part_S1_3_04() {
  union() {
    // Lower outer Mu-metal shield
    translate([0.000, 0.000, -55.500]) {
      difference() {
        cylinder(d=108.000, h=62.000, center=true);
        cylinder(d=104.000, h=64.000, center=true);
      }
    }
    // Lower inner Mu-metal shield
    translate([0.000, 0.000, -55.500]) {
      difference() {
        cylinder(d=94.000, h=62.000, center=true);
        cylinder(d=90.000, h=64.000, center=true);
      }
    }
    // Upper HDA outer Mu-metal shield (R=60.5..62.0)
    translate([0.000, 0.000, 54.000]) {
      difference() {
        cylinder(d=124.000, h=65.000, center=true);
        cylinder(d=121.000, h=67.000, center=true);
      }
    }
    // Upper HDA inner Mu-metal shield (R=57.0..58.5)
    translate([0.000, 0.000, 54.000]) {
      difference() {
        cylinder(d=117.000, h=65.000, center=true);
        cylinder(d=114.000, h=67.000, center=true);
      }
    }
  }
}

// World assembly mounting transform (global machine frame, mm / deg):
// translate([0.000, 0.000, 128.500]) rotate([0.000, 0.000, 0.000]) part_S1_3_04();

part_S1_3_04();
